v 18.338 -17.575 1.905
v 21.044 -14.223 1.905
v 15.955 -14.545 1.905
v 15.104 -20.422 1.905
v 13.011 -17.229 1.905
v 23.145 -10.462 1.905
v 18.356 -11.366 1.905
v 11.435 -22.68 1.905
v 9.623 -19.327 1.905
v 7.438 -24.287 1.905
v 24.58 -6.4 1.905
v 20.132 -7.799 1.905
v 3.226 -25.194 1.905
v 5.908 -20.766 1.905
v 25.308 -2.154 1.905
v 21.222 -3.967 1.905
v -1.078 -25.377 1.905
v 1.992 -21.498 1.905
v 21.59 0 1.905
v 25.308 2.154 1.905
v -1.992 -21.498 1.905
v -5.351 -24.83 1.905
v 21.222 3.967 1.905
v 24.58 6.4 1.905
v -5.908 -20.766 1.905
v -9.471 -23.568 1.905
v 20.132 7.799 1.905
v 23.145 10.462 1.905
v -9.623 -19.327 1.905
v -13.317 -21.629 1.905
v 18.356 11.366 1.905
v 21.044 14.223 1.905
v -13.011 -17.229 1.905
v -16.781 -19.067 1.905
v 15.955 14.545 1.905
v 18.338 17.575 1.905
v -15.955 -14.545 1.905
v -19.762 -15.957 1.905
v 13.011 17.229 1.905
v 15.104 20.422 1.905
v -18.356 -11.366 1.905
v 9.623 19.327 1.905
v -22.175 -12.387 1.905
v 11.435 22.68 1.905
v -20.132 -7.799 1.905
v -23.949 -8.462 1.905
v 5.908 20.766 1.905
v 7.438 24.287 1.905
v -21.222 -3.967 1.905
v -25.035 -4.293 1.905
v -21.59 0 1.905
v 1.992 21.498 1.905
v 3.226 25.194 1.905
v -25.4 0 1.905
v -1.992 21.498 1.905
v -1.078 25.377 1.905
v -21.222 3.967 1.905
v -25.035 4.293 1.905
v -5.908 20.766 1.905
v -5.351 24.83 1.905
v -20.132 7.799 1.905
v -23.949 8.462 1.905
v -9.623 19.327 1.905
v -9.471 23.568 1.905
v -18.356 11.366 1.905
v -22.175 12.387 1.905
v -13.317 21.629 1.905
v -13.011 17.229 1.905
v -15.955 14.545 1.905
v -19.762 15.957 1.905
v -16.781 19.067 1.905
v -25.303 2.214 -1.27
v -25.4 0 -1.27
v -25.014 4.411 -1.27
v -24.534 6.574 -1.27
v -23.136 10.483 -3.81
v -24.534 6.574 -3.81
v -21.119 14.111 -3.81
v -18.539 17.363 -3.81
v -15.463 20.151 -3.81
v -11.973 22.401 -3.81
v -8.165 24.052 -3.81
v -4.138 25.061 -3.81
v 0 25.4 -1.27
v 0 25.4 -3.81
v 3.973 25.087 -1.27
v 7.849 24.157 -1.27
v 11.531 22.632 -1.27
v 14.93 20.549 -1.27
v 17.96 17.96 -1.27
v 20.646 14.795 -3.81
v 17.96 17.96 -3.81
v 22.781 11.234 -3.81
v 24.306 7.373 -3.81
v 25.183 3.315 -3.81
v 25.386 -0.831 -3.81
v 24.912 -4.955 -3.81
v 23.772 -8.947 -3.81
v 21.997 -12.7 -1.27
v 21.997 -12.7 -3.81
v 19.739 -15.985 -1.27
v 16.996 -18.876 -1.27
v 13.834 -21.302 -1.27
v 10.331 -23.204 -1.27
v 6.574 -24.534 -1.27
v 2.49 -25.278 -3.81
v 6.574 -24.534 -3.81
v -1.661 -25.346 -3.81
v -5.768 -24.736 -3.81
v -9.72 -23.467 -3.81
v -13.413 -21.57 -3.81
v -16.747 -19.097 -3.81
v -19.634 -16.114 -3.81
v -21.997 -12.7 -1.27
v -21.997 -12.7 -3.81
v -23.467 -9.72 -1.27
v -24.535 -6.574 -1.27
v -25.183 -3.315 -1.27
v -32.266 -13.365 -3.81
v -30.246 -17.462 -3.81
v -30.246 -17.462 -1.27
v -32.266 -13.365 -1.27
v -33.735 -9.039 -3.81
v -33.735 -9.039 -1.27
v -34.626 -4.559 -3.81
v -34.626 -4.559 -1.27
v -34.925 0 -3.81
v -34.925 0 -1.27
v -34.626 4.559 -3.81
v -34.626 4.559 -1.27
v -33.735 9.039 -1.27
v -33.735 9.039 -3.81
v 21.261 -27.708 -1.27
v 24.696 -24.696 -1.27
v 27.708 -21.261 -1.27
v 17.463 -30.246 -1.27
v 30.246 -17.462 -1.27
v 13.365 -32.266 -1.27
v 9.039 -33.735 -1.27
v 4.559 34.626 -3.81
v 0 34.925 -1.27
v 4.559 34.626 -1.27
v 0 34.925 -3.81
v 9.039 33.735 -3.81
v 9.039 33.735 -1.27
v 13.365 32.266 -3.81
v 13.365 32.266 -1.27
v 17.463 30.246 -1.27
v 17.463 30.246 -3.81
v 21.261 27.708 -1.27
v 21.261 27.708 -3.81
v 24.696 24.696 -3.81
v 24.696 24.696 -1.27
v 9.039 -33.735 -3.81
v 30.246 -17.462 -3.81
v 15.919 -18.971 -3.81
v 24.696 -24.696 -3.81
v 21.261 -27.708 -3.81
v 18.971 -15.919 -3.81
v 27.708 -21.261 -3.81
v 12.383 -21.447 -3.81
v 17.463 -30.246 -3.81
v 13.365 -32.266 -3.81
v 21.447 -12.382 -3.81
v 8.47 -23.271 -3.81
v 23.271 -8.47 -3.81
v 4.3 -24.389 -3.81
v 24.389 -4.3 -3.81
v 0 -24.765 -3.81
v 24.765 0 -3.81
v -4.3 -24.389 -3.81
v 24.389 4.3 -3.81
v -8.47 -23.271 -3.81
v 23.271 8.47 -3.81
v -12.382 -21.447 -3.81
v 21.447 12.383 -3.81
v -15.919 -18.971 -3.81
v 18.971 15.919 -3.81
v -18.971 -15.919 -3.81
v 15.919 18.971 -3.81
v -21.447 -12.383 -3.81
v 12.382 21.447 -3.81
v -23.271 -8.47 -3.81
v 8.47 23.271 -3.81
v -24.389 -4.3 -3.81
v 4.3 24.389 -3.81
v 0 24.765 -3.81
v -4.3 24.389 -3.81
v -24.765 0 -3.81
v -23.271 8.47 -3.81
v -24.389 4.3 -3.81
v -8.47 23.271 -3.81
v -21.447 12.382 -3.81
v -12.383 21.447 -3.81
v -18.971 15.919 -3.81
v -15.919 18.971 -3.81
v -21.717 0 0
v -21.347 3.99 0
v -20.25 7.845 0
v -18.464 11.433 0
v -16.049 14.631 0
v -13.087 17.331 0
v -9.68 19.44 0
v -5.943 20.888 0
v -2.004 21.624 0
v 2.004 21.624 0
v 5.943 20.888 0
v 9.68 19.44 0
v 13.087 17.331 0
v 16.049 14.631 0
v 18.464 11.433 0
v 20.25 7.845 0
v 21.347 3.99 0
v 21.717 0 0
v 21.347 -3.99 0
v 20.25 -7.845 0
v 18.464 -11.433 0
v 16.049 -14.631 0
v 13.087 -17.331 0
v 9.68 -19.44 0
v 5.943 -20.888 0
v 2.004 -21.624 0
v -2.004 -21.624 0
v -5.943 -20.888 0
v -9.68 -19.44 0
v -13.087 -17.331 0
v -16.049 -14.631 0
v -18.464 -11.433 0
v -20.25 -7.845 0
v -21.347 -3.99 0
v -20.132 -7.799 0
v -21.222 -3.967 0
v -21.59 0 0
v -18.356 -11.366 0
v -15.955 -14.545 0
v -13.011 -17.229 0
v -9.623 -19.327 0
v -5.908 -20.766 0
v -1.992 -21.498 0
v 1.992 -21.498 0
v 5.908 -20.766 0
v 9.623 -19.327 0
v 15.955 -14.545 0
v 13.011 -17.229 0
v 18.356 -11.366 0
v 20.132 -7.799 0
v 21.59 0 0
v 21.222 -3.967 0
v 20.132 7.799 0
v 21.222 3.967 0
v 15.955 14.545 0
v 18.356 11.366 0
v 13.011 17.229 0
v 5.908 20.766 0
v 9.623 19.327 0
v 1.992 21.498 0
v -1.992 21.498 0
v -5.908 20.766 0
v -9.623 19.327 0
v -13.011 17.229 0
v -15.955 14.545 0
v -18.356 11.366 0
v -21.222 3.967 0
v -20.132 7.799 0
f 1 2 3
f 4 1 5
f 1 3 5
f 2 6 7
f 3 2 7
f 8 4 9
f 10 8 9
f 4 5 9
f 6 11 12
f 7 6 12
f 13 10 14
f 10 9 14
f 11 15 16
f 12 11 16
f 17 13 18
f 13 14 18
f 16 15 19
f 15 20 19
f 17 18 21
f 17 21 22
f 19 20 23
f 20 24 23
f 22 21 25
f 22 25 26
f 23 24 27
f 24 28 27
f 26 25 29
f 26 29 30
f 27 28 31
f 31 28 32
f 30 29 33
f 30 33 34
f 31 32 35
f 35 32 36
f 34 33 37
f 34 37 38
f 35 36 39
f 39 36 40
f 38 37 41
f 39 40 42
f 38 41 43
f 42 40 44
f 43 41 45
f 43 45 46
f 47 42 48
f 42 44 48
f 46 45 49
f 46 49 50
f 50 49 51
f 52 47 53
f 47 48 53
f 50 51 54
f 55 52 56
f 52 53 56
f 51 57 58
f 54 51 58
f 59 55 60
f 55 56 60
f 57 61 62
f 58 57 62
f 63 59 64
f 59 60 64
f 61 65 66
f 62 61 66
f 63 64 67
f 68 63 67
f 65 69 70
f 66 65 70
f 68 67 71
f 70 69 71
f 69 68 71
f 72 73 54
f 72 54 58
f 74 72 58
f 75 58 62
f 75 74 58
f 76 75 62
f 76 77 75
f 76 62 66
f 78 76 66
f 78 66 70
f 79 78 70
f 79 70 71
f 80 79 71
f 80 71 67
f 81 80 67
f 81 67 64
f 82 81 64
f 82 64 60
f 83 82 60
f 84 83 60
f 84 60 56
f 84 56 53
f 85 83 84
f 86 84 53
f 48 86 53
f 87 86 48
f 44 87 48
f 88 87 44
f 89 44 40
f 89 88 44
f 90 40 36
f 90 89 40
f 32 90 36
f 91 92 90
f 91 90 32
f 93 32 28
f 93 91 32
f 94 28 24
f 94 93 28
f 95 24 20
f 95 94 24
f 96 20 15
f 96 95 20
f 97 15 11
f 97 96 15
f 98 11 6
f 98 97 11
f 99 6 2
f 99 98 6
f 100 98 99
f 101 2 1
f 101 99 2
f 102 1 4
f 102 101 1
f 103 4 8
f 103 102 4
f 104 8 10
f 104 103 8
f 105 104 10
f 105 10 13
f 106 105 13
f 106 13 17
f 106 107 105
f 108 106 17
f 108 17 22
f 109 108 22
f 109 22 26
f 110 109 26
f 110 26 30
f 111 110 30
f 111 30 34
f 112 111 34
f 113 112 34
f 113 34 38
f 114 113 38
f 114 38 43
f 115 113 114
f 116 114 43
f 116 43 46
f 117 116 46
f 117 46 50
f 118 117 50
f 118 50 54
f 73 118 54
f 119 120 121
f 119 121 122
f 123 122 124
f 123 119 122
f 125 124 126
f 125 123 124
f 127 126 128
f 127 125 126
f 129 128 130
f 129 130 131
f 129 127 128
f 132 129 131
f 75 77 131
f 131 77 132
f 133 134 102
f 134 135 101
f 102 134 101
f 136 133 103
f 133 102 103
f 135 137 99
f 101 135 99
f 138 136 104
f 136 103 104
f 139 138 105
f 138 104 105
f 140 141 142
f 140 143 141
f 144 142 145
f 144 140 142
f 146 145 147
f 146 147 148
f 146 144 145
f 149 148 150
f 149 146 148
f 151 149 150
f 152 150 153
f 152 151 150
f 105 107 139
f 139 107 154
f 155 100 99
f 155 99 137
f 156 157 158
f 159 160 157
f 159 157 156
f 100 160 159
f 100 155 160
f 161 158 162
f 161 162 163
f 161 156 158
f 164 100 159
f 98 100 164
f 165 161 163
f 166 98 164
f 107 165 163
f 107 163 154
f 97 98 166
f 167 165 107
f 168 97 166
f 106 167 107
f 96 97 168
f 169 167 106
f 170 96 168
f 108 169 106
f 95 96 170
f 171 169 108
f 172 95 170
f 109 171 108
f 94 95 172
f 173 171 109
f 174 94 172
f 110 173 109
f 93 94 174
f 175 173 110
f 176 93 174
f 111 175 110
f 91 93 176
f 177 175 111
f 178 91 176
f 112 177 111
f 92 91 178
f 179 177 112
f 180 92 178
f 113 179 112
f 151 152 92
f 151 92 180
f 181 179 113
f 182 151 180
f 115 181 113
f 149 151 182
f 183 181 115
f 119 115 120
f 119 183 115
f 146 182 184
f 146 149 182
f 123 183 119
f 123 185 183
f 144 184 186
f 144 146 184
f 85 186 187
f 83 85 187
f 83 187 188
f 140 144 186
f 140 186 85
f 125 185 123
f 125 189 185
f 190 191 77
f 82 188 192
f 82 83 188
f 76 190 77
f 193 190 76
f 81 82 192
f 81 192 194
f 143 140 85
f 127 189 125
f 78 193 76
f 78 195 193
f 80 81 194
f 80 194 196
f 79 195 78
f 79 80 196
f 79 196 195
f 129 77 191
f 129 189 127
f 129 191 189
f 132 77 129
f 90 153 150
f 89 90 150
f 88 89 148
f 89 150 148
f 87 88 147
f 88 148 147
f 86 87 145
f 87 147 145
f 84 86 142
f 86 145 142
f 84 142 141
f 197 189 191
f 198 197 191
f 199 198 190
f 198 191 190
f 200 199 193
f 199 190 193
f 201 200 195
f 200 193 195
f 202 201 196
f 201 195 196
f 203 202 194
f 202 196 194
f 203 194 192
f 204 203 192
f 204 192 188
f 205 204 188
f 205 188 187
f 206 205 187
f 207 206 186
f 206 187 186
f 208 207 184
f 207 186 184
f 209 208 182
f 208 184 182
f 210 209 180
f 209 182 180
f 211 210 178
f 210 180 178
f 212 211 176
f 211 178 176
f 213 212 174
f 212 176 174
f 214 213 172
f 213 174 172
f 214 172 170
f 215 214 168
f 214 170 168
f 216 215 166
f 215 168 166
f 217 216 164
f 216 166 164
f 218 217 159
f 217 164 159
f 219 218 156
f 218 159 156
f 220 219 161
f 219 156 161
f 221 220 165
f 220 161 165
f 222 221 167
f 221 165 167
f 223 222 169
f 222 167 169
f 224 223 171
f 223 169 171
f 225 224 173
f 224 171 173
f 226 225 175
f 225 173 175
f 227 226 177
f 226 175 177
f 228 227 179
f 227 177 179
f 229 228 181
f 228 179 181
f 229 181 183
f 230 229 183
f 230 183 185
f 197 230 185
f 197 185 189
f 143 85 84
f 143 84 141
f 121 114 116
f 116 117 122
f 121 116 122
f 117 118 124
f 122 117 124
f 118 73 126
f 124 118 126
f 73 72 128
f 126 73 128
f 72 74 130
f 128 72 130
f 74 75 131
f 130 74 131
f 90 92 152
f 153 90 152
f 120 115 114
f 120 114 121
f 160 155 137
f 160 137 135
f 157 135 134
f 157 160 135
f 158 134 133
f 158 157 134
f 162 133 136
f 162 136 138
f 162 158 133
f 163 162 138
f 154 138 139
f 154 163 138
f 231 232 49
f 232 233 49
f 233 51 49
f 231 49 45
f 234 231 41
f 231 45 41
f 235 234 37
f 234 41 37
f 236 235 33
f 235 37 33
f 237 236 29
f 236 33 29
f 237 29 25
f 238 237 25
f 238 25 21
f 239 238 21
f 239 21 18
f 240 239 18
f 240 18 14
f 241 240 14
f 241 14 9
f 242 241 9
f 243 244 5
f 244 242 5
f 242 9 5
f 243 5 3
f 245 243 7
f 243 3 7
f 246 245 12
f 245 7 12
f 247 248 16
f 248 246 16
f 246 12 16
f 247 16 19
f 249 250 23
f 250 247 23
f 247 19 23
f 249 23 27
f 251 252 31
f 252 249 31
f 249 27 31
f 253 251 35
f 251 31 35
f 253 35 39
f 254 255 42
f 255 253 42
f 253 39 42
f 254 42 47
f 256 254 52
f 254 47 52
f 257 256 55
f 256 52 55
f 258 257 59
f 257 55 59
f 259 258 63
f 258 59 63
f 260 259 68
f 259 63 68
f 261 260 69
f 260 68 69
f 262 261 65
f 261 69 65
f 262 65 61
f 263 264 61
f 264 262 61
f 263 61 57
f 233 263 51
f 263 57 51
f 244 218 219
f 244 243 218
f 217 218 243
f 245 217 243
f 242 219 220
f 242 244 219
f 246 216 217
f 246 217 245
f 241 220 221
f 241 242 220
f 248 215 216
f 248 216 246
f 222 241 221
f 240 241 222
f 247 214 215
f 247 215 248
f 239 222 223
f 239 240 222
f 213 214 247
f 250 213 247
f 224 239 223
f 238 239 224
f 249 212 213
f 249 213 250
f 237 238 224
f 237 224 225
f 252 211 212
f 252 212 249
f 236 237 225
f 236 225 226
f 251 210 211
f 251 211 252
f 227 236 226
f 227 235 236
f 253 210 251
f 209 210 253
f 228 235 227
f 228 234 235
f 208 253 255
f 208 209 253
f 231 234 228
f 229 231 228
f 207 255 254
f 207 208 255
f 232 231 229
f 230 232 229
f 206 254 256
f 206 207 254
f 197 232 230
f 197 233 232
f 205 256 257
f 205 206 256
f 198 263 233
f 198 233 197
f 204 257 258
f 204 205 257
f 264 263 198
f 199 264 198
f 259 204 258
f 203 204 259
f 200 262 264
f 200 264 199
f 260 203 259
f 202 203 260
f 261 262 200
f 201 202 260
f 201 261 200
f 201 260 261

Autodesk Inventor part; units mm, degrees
ref_plane "YZ Plane" through (0, 0, 0) normal (1, 0, 0) x (0, 1, 0)
ref_plane "XZ Plane" through (0, 0, 0) normal (0, 1, 0) x (-1, 0, 0)
ref_plane "XY Plane" through (0, 0, 0) normal (0, 0, 1) x (1, 0, 0)
sketch "Sketch1" plane through (0, 0, 0) normal (0, 1, 0) x (-1, 0, 0)
  line L0 (0, 0) -> (21.717, 0)
  line L1 (0, 0) -> (0, -12.7)
  line L2 (21.717, 0) -> (24.765, 0)
  line L3 (24.765, 0) -> (24.765, -3.81)
  line L4 (24.765, -3.81) -> (21.717, 0)
  line L5 (24.765, 0) -> (25.4, 0)
  line L6 (25.4, 0) -> (25.4, -3.81)
  line L7 (25.4, -3.81) -> (24.765, -3.81)
  line L8 (24.765, -3.81) -> (24.765, 0)
  line L9 (25.4, 0) -> (21.59, 0)
  line L10 (21.59, 0) -> (21.59, 1.905)
  line L11 (21.59, 1.905) -> (25.4, 1.905)
  line L12 (25.4, 1.905) -> (25.4, 0)
  dimension "d0" = 21.717
  dimension "d1" = 12.7
  dimension "d2" = 3.048
  dimension "d3" = 3.81
  dimension "d4" = 0.635
  dimension "d6" = 1.905
revolve "Revolution1" add sketch "Sketch1" angle 360 about axis through (0, 0, 0) along (0, 0, -1)
sketch "Sketch3" plane through (0, 0, -3.81) normal (0, 0, -1) x (-1, 0, 0)
  circle A0 centre (0, 0) radius 25.4
  circle A1 centre (0, 0) radius 34.925
  line L0 (0, 0) -> (0, 34.925)
  line L1 (0, 0) -> (-24.6957, 24.6957)
  line L2 (0, 0) -> (34.925, 0) construction
  circle A2 centre (0, 0) radius 25.4 projected
  line L3 (0, 0) -> (-30.2459, -17.4625)
  line L4 (0, 0) -> (34.925, 0) construction
  line L5 (0, 0) -> (-9.0393, -33.735)
  line L6 (0, 0) -> (34.925, 0) construction
  line L7 (0, 0) -> (30.2459, -17.4625)
  line L8 (0, 0) -> (34.925, 0) construction
  line L9 (0, 0) -> (33.735, 9.0393)
  line L10 (0, 0) -> (34.925, 0) construction
  arc A3 (0, 25.4) -> (-17.9605, 17.9605) centre (0, 0) ccw
  arc A4 (-21.997, -12.7) -> (-6.574, -24.5345) centre (0, 0) ccw
  arc A5 (21.997, -12.7) -> (24.5345, 6.574) centre (0, 0) ccw
  dimension "d7" = 69.85
  dimension "d8" = 135
  dimension "d9" = 150
  dimension "d10" = 105
  dimension "d11" = 30
  dimension "d12" = 15
extrude "Extrusion1" add sketch "Sketch3" against normal blind 2.54 contours A0 L9 A1 L7 | A0 L1 A1 L0 | L5 A1 L3 A0
properties part number "FanMount" material "PC/ABS Plastic"
